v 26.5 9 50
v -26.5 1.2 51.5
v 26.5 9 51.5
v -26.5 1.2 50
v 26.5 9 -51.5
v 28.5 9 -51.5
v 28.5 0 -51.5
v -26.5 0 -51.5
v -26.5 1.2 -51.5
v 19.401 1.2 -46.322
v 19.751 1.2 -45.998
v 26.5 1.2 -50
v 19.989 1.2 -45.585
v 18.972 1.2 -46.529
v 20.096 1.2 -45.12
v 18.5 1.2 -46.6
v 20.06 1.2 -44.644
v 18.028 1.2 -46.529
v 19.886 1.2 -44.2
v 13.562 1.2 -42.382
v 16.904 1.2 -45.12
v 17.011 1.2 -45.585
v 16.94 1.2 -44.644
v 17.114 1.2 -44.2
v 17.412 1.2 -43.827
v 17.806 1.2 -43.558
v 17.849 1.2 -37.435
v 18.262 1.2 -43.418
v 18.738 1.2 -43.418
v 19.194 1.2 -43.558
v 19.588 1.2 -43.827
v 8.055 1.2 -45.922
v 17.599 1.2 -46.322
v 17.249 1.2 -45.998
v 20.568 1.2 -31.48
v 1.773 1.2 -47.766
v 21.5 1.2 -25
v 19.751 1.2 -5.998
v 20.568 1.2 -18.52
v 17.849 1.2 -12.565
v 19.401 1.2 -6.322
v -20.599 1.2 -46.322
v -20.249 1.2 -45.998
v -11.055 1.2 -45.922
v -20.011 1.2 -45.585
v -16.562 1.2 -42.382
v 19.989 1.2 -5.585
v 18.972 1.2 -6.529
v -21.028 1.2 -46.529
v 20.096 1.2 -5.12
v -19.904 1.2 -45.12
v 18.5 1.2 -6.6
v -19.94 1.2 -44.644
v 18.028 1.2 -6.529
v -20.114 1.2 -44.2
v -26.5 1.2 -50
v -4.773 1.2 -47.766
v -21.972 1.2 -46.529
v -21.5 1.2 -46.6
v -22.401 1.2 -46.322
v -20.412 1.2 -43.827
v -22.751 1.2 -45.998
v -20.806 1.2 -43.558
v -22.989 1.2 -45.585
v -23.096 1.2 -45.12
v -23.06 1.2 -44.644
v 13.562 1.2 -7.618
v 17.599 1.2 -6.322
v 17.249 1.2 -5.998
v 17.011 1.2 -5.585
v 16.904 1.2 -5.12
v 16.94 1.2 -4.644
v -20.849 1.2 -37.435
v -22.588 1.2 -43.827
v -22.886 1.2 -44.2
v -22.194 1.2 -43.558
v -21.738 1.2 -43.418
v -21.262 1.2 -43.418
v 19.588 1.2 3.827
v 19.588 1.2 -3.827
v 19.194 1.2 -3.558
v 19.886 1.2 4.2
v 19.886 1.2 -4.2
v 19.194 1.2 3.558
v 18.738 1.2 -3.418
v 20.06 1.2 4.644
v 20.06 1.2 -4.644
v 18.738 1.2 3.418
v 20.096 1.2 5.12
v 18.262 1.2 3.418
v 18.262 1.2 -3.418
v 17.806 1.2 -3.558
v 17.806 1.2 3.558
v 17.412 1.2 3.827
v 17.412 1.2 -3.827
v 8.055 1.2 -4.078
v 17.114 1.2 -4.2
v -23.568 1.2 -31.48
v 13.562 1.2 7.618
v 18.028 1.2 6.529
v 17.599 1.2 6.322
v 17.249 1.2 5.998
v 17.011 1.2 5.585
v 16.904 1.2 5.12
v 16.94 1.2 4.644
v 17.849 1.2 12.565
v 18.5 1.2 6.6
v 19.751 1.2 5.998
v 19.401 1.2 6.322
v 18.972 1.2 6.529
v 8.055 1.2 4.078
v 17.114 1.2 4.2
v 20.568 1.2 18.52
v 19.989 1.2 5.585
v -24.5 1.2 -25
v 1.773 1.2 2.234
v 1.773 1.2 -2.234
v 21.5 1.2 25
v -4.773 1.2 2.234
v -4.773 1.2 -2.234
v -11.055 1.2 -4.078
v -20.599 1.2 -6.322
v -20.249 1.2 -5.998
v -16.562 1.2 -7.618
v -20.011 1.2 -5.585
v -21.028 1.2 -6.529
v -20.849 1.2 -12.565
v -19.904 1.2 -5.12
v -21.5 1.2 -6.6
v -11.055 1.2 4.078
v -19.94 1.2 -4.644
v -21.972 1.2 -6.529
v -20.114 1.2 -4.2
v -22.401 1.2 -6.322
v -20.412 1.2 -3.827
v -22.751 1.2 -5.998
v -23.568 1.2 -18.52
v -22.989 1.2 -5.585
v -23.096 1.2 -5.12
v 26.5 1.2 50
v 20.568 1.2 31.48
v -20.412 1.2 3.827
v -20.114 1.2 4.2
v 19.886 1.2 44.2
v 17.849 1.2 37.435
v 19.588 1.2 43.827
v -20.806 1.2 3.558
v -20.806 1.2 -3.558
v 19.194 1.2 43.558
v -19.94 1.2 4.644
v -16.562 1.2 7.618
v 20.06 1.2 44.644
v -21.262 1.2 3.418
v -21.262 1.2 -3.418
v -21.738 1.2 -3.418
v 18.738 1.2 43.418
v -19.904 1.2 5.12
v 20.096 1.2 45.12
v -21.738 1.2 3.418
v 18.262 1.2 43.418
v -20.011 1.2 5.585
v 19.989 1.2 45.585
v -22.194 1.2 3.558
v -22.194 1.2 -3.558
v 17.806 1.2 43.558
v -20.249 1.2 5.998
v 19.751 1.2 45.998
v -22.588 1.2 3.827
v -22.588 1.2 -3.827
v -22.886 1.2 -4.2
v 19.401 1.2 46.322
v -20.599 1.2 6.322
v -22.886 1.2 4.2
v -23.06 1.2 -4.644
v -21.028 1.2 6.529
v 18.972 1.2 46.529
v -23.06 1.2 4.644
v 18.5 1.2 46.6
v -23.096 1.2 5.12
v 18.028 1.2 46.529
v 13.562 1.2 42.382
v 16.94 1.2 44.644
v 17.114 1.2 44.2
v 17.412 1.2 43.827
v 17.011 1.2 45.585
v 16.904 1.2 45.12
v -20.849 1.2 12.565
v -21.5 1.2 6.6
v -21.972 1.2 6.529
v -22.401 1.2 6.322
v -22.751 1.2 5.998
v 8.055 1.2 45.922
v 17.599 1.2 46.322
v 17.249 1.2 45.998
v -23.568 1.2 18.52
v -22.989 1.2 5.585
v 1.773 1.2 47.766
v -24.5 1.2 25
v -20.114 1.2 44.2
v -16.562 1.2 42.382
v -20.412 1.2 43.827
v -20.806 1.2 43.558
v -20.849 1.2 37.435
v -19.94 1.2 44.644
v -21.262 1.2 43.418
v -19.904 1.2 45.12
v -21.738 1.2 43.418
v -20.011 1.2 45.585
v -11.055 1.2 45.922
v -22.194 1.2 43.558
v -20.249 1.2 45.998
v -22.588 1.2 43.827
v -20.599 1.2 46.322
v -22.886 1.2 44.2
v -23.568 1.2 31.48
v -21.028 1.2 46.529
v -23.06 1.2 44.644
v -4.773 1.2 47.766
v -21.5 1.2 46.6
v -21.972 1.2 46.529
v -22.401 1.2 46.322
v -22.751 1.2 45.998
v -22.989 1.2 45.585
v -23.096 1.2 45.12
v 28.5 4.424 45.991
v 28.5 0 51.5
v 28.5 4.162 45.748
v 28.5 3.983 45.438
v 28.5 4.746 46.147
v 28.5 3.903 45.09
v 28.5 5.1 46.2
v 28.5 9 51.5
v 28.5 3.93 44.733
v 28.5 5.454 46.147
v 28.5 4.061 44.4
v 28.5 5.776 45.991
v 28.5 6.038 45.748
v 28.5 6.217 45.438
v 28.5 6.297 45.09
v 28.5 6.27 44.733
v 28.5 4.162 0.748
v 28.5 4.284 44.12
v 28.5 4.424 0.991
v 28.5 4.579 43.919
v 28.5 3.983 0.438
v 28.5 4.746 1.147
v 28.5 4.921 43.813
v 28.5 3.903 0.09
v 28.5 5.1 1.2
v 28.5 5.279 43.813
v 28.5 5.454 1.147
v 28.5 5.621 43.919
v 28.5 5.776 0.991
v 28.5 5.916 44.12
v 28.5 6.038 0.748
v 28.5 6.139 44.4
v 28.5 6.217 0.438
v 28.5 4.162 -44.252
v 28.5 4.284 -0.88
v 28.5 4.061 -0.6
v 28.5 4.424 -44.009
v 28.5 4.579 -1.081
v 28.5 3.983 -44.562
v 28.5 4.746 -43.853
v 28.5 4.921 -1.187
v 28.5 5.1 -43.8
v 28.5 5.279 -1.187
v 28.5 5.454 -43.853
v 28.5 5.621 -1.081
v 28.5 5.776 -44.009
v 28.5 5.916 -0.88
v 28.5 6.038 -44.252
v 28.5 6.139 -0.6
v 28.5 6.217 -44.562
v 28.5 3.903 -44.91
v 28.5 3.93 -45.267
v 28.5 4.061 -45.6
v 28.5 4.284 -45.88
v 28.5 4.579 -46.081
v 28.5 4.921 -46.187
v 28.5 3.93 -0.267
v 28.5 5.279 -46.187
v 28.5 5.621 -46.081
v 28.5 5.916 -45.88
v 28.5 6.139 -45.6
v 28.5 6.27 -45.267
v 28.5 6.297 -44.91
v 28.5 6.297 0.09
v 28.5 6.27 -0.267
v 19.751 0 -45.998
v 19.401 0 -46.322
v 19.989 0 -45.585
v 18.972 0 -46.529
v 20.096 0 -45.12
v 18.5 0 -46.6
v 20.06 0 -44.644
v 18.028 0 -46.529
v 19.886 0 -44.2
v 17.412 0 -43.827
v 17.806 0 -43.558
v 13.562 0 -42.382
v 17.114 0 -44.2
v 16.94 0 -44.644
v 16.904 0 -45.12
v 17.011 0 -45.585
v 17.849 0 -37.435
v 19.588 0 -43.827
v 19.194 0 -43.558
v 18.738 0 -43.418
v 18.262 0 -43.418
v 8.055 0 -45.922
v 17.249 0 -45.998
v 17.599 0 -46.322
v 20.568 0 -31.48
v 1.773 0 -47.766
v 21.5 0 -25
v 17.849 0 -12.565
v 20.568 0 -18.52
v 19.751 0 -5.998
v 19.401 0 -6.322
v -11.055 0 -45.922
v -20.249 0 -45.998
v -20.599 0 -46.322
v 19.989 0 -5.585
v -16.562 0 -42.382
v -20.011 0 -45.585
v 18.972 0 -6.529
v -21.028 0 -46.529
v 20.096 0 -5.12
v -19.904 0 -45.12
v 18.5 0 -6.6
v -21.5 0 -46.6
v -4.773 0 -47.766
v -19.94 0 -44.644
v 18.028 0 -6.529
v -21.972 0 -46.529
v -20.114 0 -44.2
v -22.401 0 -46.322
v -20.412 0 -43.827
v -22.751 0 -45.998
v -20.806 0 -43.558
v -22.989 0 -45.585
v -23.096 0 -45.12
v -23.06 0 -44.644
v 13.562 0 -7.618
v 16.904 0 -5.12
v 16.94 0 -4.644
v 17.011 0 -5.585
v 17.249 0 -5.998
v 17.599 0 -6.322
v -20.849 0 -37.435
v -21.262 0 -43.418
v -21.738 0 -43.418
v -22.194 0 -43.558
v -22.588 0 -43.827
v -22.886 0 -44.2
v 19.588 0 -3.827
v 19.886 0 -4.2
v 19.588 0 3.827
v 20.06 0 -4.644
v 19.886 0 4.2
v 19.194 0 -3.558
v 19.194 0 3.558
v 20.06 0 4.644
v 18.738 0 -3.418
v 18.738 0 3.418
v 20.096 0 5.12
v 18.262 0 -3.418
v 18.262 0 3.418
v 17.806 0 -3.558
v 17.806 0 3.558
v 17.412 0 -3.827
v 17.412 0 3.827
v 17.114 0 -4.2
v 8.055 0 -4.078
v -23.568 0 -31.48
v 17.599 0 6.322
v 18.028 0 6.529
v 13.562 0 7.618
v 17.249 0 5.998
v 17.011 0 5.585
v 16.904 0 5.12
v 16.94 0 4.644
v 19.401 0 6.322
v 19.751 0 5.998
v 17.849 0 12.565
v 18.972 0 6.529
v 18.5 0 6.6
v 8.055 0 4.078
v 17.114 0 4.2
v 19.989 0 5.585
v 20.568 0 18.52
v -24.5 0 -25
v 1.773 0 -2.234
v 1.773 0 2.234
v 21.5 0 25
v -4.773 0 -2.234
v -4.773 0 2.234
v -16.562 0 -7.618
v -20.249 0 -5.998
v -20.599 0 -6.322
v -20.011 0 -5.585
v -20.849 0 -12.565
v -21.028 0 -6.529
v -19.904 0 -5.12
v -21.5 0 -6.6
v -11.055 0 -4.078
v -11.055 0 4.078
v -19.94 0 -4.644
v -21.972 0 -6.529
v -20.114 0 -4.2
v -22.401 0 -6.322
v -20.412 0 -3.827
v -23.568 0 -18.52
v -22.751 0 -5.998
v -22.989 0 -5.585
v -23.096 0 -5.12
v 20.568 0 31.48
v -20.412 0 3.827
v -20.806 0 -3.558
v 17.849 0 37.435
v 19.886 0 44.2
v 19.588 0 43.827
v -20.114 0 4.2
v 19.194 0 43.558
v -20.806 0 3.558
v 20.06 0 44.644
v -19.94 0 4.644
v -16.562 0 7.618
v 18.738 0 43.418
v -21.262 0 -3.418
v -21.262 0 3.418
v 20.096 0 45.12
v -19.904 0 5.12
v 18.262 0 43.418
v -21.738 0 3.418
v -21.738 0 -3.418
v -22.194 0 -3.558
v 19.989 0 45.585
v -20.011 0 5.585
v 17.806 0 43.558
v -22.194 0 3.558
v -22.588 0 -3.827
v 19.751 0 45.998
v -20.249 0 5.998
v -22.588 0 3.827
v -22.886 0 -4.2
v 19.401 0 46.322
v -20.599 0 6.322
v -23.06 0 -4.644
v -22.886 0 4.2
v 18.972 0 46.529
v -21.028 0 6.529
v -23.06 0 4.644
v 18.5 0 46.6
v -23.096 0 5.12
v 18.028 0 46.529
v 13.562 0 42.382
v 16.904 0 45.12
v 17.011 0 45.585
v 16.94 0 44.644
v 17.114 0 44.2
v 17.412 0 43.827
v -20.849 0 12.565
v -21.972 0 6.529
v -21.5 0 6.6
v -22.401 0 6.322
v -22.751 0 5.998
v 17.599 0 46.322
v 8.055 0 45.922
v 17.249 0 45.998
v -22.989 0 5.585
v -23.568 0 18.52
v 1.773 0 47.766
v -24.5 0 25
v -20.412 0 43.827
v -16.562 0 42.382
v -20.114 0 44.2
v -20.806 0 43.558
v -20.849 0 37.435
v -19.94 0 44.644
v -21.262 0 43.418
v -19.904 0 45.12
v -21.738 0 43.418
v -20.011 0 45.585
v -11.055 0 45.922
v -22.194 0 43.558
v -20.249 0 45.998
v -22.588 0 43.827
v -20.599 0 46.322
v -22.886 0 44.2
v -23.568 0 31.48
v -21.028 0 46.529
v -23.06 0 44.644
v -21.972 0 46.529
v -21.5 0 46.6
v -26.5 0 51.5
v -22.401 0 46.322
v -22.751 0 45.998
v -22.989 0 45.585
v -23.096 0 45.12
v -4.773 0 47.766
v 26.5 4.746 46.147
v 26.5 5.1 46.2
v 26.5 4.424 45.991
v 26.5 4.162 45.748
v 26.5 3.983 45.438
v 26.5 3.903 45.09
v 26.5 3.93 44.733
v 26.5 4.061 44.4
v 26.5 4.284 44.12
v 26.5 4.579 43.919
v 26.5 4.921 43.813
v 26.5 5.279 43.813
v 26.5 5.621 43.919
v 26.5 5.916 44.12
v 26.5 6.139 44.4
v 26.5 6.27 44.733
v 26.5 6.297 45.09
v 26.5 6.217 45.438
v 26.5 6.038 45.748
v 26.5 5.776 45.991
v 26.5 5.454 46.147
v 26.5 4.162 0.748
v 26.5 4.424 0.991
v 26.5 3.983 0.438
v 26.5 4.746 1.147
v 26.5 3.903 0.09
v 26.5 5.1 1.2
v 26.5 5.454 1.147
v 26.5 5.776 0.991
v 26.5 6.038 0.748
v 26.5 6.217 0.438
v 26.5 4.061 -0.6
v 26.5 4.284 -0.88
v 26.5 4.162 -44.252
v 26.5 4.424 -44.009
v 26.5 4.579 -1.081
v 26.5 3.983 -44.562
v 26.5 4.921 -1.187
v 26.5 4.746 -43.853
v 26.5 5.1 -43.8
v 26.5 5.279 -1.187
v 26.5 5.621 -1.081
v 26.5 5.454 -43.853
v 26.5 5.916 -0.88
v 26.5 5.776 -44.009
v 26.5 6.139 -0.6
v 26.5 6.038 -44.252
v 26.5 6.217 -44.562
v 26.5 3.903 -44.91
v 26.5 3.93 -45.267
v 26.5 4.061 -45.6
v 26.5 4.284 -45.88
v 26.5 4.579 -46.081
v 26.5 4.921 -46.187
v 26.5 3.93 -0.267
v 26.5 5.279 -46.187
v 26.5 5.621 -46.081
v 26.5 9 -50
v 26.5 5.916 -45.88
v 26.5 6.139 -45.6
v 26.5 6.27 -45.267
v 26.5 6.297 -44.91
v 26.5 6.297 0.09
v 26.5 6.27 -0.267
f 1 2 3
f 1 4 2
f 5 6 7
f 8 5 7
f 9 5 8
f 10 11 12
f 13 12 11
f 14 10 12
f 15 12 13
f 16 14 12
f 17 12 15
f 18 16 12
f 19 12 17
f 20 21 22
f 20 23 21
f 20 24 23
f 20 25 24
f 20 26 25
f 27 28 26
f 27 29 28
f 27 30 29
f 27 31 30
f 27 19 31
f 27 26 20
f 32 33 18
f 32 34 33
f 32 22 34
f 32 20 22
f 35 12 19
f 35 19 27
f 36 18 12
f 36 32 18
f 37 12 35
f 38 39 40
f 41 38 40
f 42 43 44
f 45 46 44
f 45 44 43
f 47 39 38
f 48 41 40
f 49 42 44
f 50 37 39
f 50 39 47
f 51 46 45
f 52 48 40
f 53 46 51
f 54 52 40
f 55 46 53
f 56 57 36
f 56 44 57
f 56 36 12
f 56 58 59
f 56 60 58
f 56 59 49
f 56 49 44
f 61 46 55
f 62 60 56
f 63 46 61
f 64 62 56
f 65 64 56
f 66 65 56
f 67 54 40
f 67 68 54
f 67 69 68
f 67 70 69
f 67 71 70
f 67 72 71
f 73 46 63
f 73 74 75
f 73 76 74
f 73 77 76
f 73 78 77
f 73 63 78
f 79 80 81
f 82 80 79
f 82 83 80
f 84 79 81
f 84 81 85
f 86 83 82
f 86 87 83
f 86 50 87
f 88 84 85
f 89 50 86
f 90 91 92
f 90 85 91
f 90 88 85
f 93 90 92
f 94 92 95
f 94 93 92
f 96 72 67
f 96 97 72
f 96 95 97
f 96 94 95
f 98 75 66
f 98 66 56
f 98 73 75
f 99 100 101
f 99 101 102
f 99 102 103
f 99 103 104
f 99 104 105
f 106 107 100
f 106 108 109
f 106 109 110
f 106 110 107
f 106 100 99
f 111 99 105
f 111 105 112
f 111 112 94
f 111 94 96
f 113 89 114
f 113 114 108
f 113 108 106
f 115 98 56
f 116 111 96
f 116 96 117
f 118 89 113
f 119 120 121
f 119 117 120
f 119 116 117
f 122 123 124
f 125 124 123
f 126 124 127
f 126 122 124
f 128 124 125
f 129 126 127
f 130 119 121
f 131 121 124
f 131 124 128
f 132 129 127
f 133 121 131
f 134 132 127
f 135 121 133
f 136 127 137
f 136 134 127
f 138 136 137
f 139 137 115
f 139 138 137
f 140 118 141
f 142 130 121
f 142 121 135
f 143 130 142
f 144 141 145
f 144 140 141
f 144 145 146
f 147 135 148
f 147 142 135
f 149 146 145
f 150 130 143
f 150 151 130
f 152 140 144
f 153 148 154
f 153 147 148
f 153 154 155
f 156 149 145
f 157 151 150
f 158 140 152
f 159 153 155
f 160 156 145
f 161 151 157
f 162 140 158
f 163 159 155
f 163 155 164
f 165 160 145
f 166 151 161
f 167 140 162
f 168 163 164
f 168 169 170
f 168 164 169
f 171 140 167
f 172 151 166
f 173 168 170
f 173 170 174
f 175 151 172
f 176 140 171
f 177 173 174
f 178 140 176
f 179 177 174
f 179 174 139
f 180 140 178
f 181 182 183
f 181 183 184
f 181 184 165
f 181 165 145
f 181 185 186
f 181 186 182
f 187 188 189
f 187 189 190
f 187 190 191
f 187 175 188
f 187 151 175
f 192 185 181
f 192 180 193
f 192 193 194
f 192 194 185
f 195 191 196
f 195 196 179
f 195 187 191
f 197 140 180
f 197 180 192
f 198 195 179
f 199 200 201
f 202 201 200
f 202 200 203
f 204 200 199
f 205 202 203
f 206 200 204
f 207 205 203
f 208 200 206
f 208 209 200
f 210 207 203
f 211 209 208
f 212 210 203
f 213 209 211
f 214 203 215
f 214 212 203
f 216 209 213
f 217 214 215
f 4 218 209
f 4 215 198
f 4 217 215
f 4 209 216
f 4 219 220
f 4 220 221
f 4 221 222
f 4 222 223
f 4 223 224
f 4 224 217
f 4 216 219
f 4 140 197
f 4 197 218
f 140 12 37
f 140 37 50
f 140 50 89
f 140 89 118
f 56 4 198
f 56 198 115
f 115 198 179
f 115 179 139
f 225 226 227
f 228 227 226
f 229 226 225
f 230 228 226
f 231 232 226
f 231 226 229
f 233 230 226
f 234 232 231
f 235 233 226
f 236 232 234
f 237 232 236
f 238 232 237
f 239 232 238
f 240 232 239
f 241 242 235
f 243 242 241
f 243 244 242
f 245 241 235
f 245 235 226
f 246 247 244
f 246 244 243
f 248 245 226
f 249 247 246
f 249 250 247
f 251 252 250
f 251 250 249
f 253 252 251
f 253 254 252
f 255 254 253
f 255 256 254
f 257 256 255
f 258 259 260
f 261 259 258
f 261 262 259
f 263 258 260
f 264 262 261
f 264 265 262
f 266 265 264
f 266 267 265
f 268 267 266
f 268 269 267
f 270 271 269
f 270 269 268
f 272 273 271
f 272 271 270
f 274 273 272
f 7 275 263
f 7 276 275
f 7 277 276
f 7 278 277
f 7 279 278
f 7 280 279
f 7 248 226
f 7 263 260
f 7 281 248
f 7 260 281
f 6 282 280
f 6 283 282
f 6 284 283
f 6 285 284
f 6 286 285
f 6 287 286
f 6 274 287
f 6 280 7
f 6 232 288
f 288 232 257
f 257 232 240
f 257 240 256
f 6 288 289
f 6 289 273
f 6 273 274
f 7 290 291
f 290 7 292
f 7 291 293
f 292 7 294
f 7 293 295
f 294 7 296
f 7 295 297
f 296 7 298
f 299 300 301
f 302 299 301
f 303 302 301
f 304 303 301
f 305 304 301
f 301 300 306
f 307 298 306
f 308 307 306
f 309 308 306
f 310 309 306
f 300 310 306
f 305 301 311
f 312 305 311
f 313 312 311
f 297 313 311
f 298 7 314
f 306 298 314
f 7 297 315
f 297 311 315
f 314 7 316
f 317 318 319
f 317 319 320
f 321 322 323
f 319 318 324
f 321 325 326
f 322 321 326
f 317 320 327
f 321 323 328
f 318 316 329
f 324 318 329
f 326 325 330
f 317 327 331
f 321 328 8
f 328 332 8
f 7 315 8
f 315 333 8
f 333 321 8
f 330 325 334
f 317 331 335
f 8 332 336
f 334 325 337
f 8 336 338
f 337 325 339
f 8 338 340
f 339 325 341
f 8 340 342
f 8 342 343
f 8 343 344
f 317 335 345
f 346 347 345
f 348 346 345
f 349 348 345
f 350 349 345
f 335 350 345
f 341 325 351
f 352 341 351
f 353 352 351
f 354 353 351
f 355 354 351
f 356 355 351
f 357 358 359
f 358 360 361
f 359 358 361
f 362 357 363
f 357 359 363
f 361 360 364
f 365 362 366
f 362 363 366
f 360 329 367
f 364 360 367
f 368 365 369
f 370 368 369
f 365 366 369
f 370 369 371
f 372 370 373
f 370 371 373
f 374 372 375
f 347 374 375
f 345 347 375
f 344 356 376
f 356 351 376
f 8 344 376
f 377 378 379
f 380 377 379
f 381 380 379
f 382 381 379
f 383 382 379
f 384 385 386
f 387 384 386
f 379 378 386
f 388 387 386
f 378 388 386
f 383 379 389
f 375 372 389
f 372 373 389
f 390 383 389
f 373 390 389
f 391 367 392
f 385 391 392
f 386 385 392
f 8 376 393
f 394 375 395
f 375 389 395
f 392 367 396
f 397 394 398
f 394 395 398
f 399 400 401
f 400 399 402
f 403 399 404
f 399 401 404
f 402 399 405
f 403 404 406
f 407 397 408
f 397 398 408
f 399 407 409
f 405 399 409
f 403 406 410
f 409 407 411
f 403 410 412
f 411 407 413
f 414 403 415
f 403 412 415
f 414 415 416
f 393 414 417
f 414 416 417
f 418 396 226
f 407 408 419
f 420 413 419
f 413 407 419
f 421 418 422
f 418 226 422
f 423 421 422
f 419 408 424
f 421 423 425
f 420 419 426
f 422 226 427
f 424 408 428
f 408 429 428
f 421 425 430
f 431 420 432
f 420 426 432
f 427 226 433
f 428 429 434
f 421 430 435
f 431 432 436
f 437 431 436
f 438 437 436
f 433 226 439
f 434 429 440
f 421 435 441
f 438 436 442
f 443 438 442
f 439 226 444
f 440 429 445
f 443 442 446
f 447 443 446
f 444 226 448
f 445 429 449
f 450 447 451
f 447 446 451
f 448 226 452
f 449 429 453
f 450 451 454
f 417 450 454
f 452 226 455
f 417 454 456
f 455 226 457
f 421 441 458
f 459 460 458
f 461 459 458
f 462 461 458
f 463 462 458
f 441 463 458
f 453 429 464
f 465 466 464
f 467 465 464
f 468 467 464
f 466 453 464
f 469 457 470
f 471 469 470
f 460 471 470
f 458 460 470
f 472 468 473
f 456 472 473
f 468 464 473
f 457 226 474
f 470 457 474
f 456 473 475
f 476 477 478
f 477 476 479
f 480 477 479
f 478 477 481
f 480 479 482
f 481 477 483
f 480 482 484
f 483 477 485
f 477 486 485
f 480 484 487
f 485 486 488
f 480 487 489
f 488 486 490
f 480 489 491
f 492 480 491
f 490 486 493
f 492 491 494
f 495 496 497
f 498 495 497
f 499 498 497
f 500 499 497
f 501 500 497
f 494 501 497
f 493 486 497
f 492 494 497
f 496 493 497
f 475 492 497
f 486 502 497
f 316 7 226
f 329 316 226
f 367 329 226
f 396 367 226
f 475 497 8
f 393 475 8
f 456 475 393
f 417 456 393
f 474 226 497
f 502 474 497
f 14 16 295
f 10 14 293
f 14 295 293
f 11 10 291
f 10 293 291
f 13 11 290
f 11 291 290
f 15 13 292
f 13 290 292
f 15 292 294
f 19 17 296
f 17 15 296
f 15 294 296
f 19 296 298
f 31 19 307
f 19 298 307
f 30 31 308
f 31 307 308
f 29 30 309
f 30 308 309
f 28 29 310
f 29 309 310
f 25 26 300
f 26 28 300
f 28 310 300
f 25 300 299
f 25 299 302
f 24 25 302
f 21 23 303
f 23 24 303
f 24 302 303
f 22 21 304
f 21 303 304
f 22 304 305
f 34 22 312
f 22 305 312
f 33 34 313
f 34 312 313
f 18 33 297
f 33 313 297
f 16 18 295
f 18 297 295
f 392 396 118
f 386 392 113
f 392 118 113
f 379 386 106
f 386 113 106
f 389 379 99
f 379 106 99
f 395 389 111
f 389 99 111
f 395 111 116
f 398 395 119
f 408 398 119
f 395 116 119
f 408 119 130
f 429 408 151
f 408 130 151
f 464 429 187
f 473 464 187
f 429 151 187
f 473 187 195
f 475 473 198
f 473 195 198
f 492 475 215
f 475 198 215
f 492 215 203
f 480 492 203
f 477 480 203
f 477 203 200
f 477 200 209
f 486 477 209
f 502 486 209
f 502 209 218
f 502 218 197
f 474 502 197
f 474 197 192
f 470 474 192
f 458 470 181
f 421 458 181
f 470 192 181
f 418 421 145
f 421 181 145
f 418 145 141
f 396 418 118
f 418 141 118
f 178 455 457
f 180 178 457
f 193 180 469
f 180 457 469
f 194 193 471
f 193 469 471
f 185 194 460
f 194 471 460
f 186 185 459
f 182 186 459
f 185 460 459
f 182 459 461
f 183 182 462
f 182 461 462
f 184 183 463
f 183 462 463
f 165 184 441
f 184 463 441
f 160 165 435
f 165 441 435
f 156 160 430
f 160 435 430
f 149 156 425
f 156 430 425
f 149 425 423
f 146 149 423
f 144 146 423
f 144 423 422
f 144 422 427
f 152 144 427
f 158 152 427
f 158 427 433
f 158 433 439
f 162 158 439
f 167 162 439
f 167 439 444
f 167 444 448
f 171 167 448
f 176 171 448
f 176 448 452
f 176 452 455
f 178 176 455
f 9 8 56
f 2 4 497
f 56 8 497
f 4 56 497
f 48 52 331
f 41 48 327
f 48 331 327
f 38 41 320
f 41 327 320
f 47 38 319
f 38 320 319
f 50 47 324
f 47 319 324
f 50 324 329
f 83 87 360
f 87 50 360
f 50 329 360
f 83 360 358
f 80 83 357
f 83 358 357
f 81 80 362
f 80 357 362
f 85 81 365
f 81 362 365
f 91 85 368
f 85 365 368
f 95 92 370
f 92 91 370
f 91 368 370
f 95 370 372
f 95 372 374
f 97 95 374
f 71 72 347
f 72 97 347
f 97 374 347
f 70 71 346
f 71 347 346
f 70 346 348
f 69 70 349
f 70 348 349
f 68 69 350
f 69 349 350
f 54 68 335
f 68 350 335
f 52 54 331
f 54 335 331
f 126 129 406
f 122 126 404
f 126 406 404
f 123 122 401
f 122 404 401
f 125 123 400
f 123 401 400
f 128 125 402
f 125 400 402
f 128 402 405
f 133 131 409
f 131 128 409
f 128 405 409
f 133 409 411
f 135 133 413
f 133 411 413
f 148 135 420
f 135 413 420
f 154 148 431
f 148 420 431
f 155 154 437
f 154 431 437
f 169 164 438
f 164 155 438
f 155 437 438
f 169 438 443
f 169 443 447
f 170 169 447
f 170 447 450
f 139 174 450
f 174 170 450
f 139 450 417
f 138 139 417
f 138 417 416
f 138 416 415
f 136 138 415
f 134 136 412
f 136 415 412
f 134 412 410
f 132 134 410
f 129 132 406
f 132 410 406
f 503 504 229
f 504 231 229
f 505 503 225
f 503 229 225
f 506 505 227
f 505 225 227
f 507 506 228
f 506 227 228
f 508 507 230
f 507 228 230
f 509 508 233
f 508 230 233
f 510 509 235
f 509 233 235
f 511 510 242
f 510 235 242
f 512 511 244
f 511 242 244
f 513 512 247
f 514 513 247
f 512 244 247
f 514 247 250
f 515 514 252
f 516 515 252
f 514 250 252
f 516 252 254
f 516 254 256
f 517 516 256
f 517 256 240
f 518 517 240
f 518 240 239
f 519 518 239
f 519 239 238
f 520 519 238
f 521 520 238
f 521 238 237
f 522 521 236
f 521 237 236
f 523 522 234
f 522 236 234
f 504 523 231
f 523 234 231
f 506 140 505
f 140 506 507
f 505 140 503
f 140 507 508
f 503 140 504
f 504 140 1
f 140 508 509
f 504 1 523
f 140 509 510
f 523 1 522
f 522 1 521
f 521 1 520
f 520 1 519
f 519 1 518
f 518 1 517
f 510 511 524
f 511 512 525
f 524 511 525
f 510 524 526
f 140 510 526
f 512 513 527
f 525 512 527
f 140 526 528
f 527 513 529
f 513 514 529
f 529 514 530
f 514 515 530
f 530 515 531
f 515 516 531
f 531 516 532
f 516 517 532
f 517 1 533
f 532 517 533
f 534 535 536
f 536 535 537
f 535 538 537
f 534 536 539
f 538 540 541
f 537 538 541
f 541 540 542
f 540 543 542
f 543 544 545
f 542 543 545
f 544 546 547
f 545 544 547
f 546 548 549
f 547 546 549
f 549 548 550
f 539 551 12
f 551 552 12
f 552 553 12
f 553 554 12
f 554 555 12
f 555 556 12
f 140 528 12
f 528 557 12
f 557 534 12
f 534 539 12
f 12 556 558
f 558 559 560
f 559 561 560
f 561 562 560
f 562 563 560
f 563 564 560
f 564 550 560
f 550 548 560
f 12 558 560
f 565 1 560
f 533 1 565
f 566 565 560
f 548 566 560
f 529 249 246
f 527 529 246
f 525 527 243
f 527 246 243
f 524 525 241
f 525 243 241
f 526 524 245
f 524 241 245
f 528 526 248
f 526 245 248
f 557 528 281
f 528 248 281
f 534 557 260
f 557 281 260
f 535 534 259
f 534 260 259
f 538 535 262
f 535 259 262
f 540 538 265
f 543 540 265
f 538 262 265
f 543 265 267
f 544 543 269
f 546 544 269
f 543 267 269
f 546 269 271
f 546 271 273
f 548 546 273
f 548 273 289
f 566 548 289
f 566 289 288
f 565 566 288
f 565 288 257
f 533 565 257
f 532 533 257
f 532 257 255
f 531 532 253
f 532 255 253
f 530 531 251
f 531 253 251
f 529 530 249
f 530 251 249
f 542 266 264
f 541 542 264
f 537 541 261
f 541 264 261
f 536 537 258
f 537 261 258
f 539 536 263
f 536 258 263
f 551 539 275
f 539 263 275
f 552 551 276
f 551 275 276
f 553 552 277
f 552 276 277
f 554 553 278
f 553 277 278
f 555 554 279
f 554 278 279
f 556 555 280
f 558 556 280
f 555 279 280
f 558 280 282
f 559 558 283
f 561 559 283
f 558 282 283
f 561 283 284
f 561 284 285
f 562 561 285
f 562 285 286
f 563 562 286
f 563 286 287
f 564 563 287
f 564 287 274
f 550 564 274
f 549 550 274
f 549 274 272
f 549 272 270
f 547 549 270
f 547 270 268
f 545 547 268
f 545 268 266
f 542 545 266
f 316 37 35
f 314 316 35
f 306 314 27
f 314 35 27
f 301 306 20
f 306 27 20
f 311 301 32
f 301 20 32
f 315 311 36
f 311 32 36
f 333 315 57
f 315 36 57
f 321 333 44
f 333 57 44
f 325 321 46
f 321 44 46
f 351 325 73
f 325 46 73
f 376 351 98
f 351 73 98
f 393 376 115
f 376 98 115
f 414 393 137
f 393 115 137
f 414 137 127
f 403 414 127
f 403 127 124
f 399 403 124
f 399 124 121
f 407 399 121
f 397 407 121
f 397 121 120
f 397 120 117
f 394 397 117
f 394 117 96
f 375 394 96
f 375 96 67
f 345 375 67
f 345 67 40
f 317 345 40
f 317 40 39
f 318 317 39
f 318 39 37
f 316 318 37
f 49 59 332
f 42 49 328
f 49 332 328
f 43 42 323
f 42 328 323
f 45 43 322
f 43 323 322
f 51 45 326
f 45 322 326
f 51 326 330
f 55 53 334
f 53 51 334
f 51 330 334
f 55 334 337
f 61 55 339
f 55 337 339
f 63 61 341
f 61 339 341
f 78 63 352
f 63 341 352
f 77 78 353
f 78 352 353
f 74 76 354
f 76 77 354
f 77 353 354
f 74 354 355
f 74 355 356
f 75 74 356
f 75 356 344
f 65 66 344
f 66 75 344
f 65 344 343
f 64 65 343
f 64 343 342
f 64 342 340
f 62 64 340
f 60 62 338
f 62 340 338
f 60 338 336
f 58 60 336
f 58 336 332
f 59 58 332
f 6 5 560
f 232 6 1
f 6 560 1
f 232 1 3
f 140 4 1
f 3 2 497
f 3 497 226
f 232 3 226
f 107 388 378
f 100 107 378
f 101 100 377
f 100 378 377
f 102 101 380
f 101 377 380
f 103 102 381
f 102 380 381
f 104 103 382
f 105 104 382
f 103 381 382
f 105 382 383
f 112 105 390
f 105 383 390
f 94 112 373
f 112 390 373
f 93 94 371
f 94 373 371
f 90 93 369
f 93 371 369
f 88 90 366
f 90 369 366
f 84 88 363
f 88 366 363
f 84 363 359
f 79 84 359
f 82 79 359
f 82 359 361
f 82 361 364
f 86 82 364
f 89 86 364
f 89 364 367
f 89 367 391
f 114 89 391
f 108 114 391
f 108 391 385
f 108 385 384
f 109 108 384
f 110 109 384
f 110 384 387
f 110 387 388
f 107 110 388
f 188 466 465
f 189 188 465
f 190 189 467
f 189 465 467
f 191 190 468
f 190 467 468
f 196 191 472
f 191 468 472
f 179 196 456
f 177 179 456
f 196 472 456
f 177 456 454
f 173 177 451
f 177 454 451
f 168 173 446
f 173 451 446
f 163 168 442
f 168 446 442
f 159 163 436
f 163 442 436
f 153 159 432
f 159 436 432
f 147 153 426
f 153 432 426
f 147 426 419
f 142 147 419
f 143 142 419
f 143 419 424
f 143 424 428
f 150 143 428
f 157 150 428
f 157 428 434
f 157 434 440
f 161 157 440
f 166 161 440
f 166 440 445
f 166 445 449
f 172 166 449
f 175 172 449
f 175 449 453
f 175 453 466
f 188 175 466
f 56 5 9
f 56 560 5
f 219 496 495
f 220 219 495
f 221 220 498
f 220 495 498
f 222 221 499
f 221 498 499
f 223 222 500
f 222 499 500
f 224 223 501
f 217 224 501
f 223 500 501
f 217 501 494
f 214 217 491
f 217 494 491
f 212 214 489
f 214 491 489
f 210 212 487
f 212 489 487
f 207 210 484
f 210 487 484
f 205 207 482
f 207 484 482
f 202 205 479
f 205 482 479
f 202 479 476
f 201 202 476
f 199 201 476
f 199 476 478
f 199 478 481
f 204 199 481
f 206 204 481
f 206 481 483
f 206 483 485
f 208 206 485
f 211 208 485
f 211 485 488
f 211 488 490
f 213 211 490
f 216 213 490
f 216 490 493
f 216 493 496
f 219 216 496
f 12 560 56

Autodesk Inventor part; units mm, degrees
ref_plane "YZ Plane" through (0, 0, 0) normal (1, 0, 0) x (0, 1, 0)
ref_plane "XZ Plane" through (0, 0, 0) normal (0, 1, 0) x (-1, 0, 0)
ref_plane "XY Plane" through (0, 0, 0) normal (0, 0, 1) x (1, 0, 0)
sketch "Sketch1" plane through (0, 0, 0) normal (0, 1, 0) x (-1, 0, 0)
  line L0 (-26.5, -50) -> (26.5, -50)
  line L1 (26.5, -50) -> (26.5, 50)
  line L2 (26.5, 50) -> (-26.5, 50)
  line L3 (-26.5, 50) -> (-26.5, -50)
  line L4 (-26.5, -50) -> (26.5, 50) construction
  line L5 (26.5, -50) -> (-26.5, 50) construction
  point P0 (0, 0)
  dimension "d0" = 53
  dimension "d1" = 100
extrude "Extrusion1" add sketch "Sketch1" along normal blind 1.2
sketch "Sketch2" plane through (26.5, 0, 50) normal (1, 0, 0) x (0, 0, -1)
  line L0 (100, 0) -> (0, 0) projected
  line L1 (0, 0) -> (100, 0)
  line L2 (100, 0) -> (100, 9)
  line L3 (100, 9) -> (0, 9)
  line L4 (0, 9) -> (0, 0)
  point P0 (50, 0)
  dimension "d4" = 9
extrude "Extrusion2" add sketch "Sketch2" along normal blind 2
sketch "Sketch3" plane through (26.5, 1.2, 50) normal (0, 0, 1) x (1, 0, 0)
  line L0 (-53, -1.2) -> (2, -1.2) projected
  line L1 (2, 7.8) -> (2, -1.2) projected
  line L2 (0, 7.8) -> (2, 7.8) projected
  line L3 (0, 7.8) -> (0, 0) projected
  line L4 (-53, 0) -> (0, 0) projected
  line L5 (-53, -1.2) -> (-53, 0) projected
  line L6 (0, 7.8) -> (2, 7.8) projected
  line L7 (-53, 0) -> (0, 7.8)
  point P0 (-26.5, -1.2)
extrude "Extrusion3" add sketch "Sketch3" along normal blind 1.5
mirror "Mirror1" about plane through (0, 0, 0) normal (0, 0, 1) of "Extrusion3"
sketch "Sketch4" plane through (26.5, 0, 50) normal (-1, 0, 0) x (0, 0, 1)
  line L0 (0, 1.2) -> (-100, 1.2) projected
  line L1 (0, 9) -> (0, 1.2) projected
  line L2 (-100, 9) -> (0, 9) projected
  line L3 (-100, 1.2) -> (-100, 9) projected
  line L4 (-5, 5.1) -> (-95, 5.1)
  line L5 (-100, 1.2) -> (0, 1.2) projected
  point P0 (-50, 0)
  point P1 (0, 5.1)
  point P2 (-50, 5.1)
  point P3 (-50, 9)
  dimension "d9" = 90
hole "Hole1" at (26.5, 5.1, 45) at (26.5, 5.1, 0) at (26.5, 5.1, -45) direction (1, 0, 0) diameter 2.4 end through all clearance for "Flat Head Machine Screw" size "M2" standard "Ansi Metric M Profile"
sketch "Sketch5" plane through (0, 1.2, 0) normal (0, 1, 0) x (1, 0, 0)
  circle A0 centre (-1.5, -25) radius 23
  line L0 (18.5, -5) -> (-21.5, -5)
  line L1 (-21.5, -5) -> (-21.5, -45)
  line L2 (-21.5, -45) -> (18.5, -45)
  line L3 (18.5, -45) -> (18.5, -5)
  line L4 (18.5, -5) -> (-21.5, -45) construction
  line L5 (-21.5, -5) -> (18.5, -45) construction
  line L6 (-26.5, 50) -> (-26.5, -50) projected
  point P0 (0, 0)
  dimension "d17" = 46
  dimension "d18" = 40
  dimension "d19" = 40
  dimension "d20" = 25
  dimension "d21" = 25
extrude "Extrusion4" cut sketch "Sketch5" against normal through all contours A0 L3 | L3 A0 L2 L1 L0 | L0 A0 | A0 L2 | L1 A0
hole "Hole2" at (-21.5, 1.2, 45) at (-21.5, 1.2, 5) at (18.5, 1.2, 5) at (18.5, 1.2, 45) direction (0, -1, 0) diameter 3.2 end through all clearance for "Flat Head Machine Screw" size "M3" standard "Ansi Metric M Profile"
mirror "Mirror2" about plane through (0, 0, 0) normal (0, 0, 1) of "Hole2", "Extrusion4"
equation "\"d19\" = d18"
properties part number "Fan_Bracket"
